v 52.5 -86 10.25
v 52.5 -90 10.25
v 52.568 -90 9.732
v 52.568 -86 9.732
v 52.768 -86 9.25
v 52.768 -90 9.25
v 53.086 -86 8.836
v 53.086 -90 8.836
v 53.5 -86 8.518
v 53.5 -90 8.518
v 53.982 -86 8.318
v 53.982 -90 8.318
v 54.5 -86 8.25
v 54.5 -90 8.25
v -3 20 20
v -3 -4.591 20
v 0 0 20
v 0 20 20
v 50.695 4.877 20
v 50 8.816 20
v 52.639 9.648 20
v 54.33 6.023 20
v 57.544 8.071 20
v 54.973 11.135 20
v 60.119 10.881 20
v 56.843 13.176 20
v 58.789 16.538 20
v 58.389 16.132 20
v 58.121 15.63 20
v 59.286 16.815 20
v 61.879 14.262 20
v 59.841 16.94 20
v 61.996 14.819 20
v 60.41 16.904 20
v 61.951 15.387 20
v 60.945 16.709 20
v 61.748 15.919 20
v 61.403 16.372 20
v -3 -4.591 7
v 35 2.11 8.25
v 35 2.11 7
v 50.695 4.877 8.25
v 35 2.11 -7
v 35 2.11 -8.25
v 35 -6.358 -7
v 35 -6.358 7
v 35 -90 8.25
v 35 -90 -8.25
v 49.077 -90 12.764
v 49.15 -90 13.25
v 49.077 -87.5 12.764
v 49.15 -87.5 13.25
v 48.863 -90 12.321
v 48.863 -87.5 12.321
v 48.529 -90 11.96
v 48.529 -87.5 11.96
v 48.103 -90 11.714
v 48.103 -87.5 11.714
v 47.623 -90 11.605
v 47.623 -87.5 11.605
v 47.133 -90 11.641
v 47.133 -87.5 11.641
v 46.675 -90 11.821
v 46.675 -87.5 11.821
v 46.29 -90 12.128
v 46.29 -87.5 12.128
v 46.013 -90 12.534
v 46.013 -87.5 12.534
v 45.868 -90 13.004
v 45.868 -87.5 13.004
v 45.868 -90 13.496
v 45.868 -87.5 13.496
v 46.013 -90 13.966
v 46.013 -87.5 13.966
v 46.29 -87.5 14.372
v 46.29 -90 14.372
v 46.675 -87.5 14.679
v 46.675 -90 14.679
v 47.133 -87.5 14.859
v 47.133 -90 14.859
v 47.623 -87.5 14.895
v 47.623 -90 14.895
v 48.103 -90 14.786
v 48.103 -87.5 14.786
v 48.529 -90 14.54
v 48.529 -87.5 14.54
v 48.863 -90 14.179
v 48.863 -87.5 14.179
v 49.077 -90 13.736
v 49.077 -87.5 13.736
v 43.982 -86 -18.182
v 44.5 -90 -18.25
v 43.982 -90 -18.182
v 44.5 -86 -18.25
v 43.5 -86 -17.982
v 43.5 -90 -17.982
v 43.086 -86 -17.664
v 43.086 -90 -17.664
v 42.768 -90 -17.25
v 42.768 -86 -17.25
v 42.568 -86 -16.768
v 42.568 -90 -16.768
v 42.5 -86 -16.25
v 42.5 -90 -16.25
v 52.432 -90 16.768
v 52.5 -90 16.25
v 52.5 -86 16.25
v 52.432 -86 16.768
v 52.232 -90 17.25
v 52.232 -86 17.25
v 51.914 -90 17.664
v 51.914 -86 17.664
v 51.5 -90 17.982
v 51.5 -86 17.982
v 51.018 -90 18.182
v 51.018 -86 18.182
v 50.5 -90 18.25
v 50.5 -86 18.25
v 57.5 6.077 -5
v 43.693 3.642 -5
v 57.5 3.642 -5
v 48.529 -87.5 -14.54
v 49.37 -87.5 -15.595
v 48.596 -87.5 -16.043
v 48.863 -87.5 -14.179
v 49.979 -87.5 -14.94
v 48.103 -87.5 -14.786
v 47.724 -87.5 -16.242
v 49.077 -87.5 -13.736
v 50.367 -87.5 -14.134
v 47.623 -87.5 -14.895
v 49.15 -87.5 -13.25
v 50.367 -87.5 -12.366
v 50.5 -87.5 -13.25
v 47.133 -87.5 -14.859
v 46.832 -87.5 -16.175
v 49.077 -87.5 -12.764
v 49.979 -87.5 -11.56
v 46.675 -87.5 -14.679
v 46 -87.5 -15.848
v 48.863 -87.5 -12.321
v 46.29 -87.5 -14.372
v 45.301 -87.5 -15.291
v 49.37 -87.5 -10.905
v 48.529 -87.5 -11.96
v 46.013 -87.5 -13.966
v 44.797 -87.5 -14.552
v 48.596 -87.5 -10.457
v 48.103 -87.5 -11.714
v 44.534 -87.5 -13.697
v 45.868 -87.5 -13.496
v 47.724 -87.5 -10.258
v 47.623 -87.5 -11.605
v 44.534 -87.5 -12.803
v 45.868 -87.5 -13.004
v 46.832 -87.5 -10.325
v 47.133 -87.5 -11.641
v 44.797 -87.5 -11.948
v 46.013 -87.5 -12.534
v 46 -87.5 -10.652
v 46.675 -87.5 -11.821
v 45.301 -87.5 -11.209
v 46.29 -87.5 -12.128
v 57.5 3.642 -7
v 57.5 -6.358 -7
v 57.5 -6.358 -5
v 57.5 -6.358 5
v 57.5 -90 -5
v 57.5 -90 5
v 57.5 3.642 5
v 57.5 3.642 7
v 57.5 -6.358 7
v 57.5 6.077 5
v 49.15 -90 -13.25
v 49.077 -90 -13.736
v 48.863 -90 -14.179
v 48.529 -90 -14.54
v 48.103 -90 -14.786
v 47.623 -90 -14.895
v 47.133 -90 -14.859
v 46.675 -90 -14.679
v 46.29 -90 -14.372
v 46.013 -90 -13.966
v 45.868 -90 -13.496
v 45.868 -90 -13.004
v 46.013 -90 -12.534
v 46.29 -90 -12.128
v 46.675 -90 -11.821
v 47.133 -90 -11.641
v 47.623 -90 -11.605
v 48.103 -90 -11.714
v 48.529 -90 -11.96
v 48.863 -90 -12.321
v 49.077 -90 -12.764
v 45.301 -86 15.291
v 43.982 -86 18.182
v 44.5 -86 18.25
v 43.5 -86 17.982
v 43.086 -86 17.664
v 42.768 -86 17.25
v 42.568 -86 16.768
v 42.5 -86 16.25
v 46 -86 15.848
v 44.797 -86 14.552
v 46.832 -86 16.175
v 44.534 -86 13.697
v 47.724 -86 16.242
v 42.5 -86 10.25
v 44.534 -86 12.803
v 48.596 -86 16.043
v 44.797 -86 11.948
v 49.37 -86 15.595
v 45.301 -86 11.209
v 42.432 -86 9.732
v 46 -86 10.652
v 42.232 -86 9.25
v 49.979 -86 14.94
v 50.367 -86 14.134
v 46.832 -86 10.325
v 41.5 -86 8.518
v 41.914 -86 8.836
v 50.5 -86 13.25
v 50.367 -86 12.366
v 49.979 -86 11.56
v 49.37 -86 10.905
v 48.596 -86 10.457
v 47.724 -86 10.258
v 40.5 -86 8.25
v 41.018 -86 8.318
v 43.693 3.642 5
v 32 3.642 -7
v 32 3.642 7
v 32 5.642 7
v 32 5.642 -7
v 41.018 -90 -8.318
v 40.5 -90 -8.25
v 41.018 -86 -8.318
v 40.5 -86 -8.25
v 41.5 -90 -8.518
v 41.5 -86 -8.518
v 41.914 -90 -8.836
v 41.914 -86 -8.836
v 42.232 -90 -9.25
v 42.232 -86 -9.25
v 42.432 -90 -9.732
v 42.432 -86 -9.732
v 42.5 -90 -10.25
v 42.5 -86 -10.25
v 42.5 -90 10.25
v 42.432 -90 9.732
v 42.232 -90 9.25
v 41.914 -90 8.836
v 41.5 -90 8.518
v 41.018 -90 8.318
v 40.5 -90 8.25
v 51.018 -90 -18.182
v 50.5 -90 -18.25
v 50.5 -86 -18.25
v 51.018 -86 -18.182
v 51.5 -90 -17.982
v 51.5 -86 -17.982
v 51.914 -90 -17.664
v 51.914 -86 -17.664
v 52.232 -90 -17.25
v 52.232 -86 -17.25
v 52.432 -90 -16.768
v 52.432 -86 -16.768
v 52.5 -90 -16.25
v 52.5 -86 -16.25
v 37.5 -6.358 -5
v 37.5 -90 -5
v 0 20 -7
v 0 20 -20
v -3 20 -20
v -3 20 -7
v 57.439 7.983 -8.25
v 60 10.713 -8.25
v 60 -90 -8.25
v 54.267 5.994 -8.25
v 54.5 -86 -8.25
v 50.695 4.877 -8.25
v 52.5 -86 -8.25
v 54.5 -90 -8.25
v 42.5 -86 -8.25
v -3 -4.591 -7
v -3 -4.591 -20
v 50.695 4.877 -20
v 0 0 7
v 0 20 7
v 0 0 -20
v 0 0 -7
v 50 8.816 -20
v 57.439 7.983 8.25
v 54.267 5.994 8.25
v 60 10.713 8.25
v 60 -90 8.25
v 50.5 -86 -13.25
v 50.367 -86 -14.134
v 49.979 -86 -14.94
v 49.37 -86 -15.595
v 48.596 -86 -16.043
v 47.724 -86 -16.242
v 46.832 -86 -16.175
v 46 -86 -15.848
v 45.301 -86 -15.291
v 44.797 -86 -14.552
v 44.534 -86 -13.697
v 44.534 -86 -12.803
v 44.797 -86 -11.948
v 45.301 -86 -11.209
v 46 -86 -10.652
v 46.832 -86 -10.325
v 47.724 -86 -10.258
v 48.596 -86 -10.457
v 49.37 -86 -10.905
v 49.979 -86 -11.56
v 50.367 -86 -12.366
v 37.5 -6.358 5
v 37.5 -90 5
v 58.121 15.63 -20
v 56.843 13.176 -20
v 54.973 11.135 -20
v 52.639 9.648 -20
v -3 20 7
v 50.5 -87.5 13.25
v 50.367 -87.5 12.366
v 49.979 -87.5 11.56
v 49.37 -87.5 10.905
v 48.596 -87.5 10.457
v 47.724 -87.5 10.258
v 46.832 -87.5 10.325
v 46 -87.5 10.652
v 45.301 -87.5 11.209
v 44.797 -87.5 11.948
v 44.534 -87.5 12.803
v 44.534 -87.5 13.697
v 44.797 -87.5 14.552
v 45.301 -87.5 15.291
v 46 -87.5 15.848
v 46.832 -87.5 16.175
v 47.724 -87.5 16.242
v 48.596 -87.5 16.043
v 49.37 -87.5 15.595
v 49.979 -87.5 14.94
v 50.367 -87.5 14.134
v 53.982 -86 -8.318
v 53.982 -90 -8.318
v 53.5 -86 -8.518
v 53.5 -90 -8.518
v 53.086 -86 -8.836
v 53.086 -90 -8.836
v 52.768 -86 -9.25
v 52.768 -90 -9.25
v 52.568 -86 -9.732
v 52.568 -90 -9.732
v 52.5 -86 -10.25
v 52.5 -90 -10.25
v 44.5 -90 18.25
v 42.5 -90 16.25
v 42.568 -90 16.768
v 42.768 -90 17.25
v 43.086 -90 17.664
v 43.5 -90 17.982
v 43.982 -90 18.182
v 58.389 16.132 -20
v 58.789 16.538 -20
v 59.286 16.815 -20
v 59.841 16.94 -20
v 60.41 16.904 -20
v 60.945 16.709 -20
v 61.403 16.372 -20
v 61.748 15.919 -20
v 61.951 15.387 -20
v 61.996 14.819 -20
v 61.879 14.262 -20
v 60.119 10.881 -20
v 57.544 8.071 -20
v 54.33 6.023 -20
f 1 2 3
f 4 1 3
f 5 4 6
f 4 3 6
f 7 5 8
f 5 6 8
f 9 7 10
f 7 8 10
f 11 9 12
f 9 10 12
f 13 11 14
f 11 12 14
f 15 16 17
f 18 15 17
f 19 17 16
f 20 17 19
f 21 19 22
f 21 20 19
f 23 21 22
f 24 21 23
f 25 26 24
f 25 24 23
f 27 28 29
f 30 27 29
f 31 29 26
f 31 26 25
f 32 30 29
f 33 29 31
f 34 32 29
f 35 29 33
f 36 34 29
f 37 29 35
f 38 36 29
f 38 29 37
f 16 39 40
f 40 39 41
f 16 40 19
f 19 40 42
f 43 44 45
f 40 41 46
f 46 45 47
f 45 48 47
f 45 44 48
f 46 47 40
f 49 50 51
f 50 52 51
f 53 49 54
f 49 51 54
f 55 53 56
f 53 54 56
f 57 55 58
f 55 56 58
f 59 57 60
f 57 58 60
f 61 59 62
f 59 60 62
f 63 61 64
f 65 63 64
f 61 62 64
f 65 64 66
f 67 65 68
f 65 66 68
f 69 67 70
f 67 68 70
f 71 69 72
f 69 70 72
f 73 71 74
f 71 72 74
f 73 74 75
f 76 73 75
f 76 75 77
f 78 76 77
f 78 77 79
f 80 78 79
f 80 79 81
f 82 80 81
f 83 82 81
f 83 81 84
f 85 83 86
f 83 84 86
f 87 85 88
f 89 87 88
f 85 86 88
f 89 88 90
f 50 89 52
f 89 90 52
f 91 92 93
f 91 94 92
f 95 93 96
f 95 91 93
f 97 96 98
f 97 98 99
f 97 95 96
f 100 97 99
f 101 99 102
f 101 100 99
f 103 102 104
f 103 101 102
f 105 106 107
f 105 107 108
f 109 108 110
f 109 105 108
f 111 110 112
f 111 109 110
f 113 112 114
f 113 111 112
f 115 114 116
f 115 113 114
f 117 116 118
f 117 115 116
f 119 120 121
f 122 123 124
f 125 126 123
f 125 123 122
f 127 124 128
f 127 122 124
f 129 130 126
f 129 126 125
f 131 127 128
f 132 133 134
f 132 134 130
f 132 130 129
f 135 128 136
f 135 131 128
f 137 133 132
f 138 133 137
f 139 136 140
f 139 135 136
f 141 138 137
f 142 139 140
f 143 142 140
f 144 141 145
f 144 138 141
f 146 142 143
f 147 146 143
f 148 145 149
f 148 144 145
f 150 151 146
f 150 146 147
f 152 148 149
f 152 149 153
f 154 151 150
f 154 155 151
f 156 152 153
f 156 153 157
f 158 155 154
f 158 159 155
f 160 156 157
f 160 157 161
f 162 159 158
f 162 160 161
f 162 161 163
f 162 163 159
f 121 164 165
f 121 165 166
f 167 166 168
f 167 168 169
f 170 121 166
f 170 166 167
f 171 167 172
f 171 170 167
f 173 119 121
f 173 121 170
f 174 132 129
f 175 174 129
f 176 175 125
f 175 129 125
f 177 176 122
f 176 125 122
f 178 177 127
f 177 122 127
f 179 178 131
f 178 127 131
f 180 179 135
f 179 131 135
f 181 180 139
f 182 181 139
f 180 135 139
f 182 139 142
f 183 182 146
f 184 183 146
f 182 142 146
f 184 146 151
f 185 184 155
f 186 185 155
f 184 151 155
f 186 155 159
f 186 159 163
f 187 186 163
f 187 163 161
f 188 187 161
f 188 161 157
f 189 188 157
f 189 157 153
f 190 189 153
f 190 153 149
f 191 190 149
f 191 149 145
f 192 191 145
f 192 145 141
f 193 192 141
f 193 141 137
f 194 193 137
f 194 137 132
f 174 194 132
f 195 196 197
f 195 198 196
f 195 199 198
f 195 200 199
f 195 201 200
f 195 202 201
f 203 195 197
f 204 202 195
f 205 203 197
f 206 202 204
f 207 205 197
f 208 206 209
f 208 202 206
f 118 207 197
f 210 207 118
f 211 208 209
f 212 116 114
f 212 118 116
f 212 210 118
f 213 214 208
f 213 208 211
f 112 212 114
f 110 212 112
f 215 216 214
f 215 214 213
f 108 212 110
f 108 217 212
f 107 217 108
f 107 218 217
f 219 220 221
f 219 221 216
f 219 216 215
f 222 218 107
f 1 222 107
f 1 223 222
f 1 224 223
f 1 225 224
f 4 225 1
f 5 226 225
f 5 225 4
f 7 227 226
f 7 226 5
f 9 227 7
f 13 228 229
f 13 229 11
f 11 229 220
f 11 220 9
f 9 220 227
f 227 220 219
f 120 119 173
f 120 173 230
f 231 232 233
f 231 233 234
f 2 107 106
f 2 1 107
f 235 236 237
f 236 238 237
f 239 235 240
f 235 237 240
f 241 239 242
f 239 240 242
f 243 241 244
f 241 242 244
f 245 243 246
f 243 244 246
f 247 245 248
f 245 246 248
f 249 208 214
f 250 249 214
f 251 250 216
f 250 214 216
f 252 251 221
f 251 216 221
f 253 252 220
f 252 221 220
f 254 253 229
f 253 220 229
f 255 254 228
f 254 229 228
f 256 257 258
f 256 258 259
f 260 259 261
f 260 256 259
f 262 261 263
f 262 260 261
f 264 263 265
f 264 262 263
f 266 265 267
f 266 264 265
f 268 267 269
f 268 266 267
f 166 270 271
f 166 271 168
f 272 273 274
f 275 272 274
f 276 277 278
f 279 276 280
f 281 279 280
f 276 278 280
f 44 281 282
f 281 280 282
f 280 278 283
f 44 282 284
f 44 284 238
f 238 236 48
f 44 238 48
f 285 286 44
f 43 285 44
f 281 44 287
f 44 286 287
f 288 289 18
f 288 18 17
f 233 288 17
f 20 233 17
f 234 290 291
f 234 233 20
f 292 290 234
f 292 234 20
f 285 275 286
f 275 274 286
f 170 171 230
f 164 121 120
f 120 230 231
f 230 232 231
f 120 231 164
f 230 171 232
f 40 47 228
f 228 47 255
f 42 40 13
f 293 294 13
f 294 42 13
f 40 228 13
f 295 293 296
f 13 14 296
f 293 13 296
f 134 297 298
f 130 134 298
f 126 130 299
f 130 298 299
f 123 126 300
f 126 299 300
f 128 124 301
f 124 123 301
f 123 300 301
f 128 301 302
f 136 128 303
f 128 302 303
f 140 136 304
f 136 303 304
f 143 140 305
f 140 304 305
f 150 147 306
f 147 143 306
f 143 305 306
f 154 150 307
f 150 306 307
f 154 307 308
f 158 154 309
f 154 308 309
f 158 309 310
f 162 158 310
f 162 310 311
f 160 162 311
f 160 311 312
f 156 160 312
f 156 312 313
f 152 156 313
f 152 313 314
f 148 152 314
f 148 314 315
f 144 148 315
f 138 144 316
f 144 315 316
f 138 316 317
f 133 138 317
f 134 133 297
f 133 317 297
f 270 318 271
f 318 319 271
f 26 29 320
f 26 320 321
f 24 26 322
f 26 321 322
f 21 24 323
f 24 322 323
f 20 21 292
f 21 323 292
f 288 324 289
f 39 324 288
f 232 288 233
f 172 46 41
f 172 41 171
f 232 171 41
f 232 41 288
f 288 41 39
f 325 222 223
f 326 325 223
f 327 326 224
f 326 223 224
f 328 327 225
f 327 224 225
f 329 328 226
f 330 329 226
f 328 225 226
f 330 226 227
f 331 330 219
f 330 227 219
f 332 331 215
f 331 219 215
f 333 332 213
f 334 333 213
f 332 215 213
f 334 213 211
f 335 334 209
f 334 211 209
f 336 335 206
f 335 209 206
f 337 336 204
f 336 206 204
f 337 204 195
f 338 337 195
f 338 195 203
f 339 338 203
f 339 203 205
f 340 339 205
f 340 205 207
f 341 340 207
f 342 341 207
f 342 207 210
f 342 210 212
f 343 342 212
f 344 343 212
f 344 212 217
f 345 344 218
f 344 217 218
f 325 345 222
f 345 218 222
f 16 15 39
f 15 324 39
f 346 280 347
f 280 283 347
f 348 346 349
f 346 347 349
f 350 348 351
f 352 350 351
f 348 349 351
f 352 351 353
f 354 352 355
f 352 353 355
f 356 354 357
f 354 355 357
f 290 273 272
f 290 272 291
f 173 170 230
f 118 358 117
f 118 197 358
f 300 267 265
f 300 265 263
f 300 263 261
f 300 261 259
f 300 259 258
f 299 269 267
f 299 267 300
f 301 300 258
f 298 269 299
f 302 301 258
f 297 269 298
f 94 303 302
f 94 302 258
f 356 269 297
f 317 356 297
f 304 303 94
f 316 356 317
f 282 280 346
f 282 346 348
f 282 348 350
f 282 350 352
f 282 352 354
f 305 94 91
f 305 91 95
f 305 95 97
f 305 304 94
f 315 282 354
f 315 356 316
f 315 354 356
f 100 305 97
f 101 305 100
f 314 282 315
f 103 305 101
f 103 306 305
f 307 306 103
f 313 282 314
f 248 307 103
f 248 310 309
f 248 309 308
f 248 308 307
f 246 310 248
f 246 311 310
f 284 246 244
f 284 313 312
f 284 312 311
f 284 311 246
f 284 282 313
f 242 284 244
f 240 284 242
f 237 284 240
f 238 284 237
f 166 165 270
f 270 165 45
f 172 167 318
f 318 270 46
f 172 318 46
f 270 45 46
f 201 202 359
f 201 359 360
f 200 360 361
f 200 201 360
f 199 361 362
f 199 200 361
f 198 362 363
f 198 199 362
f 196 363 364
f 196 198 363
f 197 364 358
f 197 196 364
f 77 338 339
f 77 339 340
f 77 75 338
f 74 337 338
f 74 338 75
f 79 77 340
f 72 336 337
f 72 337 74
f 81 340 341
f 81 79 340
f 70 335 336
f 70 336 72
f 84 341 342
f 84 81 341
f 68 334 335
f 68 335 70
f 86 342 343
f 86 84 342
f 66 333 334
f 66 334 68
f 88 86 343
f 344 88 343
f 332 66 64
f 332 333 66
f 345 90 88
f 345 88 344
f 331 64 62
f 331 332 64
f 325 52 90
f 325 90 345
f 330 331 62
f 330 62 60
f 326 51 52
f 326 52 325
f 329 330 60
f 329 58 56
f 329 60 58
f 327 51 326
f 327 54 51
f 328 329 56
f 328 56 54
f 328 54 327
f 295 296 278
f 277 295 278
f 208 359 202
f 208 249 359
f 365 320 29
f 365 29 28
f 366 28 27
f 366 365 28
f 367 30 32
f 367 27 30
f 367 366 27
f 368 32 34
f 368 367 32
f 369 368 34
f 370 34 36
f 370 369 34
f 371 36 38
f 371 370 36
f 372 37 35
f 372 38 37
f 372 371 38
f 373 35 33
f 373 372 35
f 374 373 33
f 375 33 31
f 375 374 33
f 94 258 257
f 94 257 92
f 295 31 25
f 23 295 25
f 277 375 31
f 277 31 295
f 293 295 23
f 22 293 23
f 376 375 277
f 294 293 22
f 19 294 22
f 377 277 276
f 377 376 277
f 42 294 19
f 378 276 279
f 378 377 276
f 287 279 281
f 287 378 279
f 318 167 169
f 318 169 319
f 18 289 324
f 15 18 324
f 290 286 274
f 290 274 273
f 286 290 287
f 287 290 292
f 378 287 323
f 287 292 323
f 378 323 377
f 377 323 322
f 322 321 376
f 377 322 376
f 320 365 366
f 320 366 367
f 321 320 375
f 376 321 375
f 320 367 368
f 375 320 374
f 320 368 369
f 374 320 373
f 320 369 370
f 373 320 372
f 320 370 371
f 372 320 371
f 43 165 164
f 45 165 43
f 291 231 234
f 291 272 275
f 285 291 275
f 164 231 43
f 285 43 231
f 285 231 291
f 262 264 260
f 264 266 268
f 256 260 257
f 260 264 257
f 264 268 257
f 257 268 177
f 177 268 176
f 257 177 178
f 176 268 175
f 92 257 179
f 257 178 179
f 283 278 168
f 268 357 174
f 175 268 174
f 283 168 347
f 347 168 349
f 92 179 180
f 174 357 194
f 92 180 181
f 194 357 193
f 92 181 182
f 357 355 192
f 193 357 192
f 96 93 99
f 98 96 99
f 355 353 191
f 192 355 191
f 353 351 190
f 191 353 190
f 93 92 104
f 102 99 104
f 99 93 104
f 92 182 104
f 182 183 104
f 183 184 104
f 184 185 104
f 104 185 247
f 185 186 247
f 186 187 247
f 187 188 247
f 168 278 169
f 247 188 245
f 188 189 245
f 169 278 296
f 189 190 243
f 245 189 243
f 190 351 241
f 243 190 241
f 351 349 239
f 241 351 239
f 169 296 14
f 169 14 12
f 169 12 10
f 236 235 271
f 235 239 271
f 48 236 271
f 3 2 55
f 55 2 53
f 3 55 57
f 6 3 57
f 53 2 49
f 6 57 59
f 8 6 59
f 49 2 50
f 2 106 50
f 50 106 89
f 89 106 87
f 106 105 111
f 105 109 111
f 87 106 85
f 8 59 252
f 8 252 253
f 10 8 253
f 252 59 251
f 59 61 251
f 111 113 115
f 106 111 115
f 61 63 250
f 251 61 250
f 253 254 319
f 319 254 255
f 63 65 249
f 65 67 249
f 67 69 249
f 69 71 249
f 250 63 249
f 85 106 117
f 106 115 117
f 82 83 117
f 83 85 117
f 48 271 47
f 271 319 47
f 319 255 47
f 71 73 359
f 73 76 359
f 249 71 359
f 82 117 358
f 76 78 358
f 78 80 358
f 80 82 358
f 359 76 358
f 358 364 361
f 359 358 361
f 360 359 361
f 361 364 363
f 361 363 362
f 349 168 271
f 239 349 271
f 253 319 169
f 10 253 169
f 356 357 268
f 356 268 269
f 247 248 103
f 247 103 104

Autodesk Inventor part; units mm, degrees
ref_plane "YZ Plane" through (0, 0, 0) normal (1, 0, 0) x (0, 1, 0)
sketch "Sketch1" plane through (0, 0, 0) normal (0, 0, 1) x (1, 0, 0)
  line L0 (0, 20) -> (0, 0)
  line L1 (0, 0) -> (50, 8.8163)
  arc A0 (50, 8.8163) -> (58.1206, 15.6304) centre (48.1592, 19.256) ccw
  line L2 (0, 0) -> (58.1206, 0) construction
  line L3 (58.1206, 15.6304) -> (52.4316, 0) construction
  line L4 (0, 20) -> (-3, 20)
  line L5 (-3, 20) -> (-3, -4.5907)
  line L6 (-3, -4.5907) -> (50.6946, 4.8771)
  arc A1 (50.6946, 4.8771) -> (61.8794, 14.2623) centre (48.1592, 19.256) ccw
  arc A2 (61.8794, 14.2623) -> (58.1206, 15.6304) centre (60, 14.9463) ccw
  dimension "d1" = 20
  dimension "d2" = 50
  dimension "d3" = 3
  dimension "d4" = 70
  dimension "d5" = 2
  dimension "d6" = 10
  dimension "d7" = 10
extrude "Extrusion1" add sketch "Sketch1" along normal mid plane 40
sketch "Sketch2" plane through (0, 0, 0) normal (0, 1, 0) x (-1, 0, 0)
  line L0 (3, 7) -> (-32, 7)
  line L1 (-32, 7) -> (-32, -7)
  line L2 (-32, -7) -> (3, -7)
  line L3 (3, -7) -> (3, 7)
  line L4 (3, -20) -> (3, 20) projected
  point P0 (0, 0)
  point P1 (3, 0)
  point P2 (3, 0)
  dimension "d10" = 14
  dimension "d11" = 35
extrude "Extrusion2" cut sketch "Sketch2" along normal through all both and the other way through all
ref_plane "Work Plane1" through (0, -90, 0) normal (0, 1, 0) x (-1, 0, 0)
sketch "Sketch3" plane through (0, -90, 0) normal (0, 1, 0) x (-1, 0, 0)
  line L0 (-60, -8.25) -> (-35, -8.25)
  line L1 (-35, -8.25) -> (-35, 8.25)
  line L2 (-35, 8.25) -> (-60, 8.25)
  line L3 (-60, 8.25) -> (-60, -8.25)
  line L4 (-60, -8.25) -> (-35, 8.25) construction
  line L5 (-35, -8.25) -> (-60, 8.25) construction
  line L6 (-32, -7) -> (-32, 7) projected
  point P0 (0, 0)
  point P1 (-47.5, 0)
  dimension "d27" = 25
  dimension "d28" = 16.5
  dimension "d29" = 3
extrude "Extrusion3" add sketch "Sketch3" along normal up to next
sketch "Sketch5" plane through (42, -90, 0) normal (0, -1, 0) x (1, 0, 0)
  line L0 (15.5, 5) -> (-4.5, 5)
  line L1 (-4.5, 5) -> (-4.5, -5)
  line L2 (-4.5, -5) -> (15.5, -5)
  line L3 (15.5, -5) -> (15.5, 5)
  line L4 (15.5, 5) -> (-4.5, -5) construction
  line L5 (-4.5, 5) -> (15.5, -5) construction
  line L6 (-7, 8.25) -> (18, 8.25) projected
  line L7 (18, 8.25) -> (18, -8.25) projected
  point P0 (-42, 0)
  point P1 (5.5, 0)
  point P2 (5.5, 8.25)
  point P3 (5.5, 5)
  point P4 (18, 0)
  point P5 (15.5, 0)
  dimension "d30" = 20
  dimension "d31" = 10
extrude "Extrusion4" cut sketch "Sketch5" against normal up to surface surface through (-3, -4.5907, 0) normal (0.1736482, -0.9848078, 0)
ref_plane "Work Plane2" through (-3, 20, 0) normal (0, 0, 1) x (1, 0, 0)
sketch "Sketch7" plane through (32, 1.5808, -7) normal (-1, 0, 0) x (0, 0, 1)
  line L0 (0, -7.9383) -> (14, -7.9383)
  line L1 (14, -7.9383) -> (14, 2.0617)
  line L2 (14, 2.0617) -> (0, 2.0617)
  line L3 (0, 2.0617) -> (0, -7.9383)
  line L4 (0, -7.9383) -> (14, 2.0617) construction
  line L5 (14, -7.9383) -> (0, 2.0617) construction
  line L6 (0, 4.0617) -> (14, 4.0617) projected
  point P0 (7, -1.5808)
  point P1 (7, -2.9383)
  point P2 (7, 4.0617)
  point P3 (7, 2.0617)
  dimension "d32" = 10
  dimension "d33" = 14
  dimension "d34" = 2
extrude "Extrusion5" cut sketch "Sketch7" against normal up to surface (25.5 mm away)
sketch "Sketch8" plane through (35, -90, 8.25) normal (0, 0, 1) x (1, 0, 0)
  line L0 (7.5, 4) -> (17.5, 4)
  line L1 (17.5, 4) -> (17.5, 0)
  line L2 (17.5, 0) -> (7.5, 0)
  line L3 (7.5, 0) -> (7.5, 4)
  line L4 (7.5, 4) -> (17.5, 0) construction
  line L5 (17.5, 4) -> (7.5, 0) construction
  line L6 (0, 0) -> (25, 0) projected
  point P0 (-35, 90)
  point P1 (12.5, 2)
  point P2 (12.5, 0)
  point P3 (12.5, 0)
  dimension "d37" = 10
  dimension "d38" = 4
extrude "Extrusion6" add sketch "Sketch8" along normal blind 10
sketch "Sketch9" plane through (42.5, -86, 8.25) normal (0, 1, 0) x (1, 0, 0)
  circle A0 centre (5, -5) radius 1.65
  circle A1 centre (5, -5) radius 3
  line L0 (10, 0) -> (10, -10) projected
  line L1 (10, -10) -> (0, -10) projected
  point P0 (-42.5, 8.25)
  point P1 (10, -5)
  point P2 (5, -10)
  dimension "d41" = 3.3
  dimension "d42" = 6
extrude "Extrusion7" cut sketch "Sketch9" against normal through all contours A0
extrude "Extrusion8" cut sketch "Sketch9" against normal blind 1.5
fillet "Fillet1" radius 2 4 edges at (52.5, -88, 18.25) (42.5, -88, 18.25) (52.5, -88, 8.25) (42.5, -88, 8.25)
mirror "Mirror1" about plane through (0, 0, 0) normal (0, 0, 1) of "Extrusion6", "Extrusion7", "Extrusion8", "Fillet1"
fillet_without_effect "Fillet2"
properties part number "Inclined Ramp"
